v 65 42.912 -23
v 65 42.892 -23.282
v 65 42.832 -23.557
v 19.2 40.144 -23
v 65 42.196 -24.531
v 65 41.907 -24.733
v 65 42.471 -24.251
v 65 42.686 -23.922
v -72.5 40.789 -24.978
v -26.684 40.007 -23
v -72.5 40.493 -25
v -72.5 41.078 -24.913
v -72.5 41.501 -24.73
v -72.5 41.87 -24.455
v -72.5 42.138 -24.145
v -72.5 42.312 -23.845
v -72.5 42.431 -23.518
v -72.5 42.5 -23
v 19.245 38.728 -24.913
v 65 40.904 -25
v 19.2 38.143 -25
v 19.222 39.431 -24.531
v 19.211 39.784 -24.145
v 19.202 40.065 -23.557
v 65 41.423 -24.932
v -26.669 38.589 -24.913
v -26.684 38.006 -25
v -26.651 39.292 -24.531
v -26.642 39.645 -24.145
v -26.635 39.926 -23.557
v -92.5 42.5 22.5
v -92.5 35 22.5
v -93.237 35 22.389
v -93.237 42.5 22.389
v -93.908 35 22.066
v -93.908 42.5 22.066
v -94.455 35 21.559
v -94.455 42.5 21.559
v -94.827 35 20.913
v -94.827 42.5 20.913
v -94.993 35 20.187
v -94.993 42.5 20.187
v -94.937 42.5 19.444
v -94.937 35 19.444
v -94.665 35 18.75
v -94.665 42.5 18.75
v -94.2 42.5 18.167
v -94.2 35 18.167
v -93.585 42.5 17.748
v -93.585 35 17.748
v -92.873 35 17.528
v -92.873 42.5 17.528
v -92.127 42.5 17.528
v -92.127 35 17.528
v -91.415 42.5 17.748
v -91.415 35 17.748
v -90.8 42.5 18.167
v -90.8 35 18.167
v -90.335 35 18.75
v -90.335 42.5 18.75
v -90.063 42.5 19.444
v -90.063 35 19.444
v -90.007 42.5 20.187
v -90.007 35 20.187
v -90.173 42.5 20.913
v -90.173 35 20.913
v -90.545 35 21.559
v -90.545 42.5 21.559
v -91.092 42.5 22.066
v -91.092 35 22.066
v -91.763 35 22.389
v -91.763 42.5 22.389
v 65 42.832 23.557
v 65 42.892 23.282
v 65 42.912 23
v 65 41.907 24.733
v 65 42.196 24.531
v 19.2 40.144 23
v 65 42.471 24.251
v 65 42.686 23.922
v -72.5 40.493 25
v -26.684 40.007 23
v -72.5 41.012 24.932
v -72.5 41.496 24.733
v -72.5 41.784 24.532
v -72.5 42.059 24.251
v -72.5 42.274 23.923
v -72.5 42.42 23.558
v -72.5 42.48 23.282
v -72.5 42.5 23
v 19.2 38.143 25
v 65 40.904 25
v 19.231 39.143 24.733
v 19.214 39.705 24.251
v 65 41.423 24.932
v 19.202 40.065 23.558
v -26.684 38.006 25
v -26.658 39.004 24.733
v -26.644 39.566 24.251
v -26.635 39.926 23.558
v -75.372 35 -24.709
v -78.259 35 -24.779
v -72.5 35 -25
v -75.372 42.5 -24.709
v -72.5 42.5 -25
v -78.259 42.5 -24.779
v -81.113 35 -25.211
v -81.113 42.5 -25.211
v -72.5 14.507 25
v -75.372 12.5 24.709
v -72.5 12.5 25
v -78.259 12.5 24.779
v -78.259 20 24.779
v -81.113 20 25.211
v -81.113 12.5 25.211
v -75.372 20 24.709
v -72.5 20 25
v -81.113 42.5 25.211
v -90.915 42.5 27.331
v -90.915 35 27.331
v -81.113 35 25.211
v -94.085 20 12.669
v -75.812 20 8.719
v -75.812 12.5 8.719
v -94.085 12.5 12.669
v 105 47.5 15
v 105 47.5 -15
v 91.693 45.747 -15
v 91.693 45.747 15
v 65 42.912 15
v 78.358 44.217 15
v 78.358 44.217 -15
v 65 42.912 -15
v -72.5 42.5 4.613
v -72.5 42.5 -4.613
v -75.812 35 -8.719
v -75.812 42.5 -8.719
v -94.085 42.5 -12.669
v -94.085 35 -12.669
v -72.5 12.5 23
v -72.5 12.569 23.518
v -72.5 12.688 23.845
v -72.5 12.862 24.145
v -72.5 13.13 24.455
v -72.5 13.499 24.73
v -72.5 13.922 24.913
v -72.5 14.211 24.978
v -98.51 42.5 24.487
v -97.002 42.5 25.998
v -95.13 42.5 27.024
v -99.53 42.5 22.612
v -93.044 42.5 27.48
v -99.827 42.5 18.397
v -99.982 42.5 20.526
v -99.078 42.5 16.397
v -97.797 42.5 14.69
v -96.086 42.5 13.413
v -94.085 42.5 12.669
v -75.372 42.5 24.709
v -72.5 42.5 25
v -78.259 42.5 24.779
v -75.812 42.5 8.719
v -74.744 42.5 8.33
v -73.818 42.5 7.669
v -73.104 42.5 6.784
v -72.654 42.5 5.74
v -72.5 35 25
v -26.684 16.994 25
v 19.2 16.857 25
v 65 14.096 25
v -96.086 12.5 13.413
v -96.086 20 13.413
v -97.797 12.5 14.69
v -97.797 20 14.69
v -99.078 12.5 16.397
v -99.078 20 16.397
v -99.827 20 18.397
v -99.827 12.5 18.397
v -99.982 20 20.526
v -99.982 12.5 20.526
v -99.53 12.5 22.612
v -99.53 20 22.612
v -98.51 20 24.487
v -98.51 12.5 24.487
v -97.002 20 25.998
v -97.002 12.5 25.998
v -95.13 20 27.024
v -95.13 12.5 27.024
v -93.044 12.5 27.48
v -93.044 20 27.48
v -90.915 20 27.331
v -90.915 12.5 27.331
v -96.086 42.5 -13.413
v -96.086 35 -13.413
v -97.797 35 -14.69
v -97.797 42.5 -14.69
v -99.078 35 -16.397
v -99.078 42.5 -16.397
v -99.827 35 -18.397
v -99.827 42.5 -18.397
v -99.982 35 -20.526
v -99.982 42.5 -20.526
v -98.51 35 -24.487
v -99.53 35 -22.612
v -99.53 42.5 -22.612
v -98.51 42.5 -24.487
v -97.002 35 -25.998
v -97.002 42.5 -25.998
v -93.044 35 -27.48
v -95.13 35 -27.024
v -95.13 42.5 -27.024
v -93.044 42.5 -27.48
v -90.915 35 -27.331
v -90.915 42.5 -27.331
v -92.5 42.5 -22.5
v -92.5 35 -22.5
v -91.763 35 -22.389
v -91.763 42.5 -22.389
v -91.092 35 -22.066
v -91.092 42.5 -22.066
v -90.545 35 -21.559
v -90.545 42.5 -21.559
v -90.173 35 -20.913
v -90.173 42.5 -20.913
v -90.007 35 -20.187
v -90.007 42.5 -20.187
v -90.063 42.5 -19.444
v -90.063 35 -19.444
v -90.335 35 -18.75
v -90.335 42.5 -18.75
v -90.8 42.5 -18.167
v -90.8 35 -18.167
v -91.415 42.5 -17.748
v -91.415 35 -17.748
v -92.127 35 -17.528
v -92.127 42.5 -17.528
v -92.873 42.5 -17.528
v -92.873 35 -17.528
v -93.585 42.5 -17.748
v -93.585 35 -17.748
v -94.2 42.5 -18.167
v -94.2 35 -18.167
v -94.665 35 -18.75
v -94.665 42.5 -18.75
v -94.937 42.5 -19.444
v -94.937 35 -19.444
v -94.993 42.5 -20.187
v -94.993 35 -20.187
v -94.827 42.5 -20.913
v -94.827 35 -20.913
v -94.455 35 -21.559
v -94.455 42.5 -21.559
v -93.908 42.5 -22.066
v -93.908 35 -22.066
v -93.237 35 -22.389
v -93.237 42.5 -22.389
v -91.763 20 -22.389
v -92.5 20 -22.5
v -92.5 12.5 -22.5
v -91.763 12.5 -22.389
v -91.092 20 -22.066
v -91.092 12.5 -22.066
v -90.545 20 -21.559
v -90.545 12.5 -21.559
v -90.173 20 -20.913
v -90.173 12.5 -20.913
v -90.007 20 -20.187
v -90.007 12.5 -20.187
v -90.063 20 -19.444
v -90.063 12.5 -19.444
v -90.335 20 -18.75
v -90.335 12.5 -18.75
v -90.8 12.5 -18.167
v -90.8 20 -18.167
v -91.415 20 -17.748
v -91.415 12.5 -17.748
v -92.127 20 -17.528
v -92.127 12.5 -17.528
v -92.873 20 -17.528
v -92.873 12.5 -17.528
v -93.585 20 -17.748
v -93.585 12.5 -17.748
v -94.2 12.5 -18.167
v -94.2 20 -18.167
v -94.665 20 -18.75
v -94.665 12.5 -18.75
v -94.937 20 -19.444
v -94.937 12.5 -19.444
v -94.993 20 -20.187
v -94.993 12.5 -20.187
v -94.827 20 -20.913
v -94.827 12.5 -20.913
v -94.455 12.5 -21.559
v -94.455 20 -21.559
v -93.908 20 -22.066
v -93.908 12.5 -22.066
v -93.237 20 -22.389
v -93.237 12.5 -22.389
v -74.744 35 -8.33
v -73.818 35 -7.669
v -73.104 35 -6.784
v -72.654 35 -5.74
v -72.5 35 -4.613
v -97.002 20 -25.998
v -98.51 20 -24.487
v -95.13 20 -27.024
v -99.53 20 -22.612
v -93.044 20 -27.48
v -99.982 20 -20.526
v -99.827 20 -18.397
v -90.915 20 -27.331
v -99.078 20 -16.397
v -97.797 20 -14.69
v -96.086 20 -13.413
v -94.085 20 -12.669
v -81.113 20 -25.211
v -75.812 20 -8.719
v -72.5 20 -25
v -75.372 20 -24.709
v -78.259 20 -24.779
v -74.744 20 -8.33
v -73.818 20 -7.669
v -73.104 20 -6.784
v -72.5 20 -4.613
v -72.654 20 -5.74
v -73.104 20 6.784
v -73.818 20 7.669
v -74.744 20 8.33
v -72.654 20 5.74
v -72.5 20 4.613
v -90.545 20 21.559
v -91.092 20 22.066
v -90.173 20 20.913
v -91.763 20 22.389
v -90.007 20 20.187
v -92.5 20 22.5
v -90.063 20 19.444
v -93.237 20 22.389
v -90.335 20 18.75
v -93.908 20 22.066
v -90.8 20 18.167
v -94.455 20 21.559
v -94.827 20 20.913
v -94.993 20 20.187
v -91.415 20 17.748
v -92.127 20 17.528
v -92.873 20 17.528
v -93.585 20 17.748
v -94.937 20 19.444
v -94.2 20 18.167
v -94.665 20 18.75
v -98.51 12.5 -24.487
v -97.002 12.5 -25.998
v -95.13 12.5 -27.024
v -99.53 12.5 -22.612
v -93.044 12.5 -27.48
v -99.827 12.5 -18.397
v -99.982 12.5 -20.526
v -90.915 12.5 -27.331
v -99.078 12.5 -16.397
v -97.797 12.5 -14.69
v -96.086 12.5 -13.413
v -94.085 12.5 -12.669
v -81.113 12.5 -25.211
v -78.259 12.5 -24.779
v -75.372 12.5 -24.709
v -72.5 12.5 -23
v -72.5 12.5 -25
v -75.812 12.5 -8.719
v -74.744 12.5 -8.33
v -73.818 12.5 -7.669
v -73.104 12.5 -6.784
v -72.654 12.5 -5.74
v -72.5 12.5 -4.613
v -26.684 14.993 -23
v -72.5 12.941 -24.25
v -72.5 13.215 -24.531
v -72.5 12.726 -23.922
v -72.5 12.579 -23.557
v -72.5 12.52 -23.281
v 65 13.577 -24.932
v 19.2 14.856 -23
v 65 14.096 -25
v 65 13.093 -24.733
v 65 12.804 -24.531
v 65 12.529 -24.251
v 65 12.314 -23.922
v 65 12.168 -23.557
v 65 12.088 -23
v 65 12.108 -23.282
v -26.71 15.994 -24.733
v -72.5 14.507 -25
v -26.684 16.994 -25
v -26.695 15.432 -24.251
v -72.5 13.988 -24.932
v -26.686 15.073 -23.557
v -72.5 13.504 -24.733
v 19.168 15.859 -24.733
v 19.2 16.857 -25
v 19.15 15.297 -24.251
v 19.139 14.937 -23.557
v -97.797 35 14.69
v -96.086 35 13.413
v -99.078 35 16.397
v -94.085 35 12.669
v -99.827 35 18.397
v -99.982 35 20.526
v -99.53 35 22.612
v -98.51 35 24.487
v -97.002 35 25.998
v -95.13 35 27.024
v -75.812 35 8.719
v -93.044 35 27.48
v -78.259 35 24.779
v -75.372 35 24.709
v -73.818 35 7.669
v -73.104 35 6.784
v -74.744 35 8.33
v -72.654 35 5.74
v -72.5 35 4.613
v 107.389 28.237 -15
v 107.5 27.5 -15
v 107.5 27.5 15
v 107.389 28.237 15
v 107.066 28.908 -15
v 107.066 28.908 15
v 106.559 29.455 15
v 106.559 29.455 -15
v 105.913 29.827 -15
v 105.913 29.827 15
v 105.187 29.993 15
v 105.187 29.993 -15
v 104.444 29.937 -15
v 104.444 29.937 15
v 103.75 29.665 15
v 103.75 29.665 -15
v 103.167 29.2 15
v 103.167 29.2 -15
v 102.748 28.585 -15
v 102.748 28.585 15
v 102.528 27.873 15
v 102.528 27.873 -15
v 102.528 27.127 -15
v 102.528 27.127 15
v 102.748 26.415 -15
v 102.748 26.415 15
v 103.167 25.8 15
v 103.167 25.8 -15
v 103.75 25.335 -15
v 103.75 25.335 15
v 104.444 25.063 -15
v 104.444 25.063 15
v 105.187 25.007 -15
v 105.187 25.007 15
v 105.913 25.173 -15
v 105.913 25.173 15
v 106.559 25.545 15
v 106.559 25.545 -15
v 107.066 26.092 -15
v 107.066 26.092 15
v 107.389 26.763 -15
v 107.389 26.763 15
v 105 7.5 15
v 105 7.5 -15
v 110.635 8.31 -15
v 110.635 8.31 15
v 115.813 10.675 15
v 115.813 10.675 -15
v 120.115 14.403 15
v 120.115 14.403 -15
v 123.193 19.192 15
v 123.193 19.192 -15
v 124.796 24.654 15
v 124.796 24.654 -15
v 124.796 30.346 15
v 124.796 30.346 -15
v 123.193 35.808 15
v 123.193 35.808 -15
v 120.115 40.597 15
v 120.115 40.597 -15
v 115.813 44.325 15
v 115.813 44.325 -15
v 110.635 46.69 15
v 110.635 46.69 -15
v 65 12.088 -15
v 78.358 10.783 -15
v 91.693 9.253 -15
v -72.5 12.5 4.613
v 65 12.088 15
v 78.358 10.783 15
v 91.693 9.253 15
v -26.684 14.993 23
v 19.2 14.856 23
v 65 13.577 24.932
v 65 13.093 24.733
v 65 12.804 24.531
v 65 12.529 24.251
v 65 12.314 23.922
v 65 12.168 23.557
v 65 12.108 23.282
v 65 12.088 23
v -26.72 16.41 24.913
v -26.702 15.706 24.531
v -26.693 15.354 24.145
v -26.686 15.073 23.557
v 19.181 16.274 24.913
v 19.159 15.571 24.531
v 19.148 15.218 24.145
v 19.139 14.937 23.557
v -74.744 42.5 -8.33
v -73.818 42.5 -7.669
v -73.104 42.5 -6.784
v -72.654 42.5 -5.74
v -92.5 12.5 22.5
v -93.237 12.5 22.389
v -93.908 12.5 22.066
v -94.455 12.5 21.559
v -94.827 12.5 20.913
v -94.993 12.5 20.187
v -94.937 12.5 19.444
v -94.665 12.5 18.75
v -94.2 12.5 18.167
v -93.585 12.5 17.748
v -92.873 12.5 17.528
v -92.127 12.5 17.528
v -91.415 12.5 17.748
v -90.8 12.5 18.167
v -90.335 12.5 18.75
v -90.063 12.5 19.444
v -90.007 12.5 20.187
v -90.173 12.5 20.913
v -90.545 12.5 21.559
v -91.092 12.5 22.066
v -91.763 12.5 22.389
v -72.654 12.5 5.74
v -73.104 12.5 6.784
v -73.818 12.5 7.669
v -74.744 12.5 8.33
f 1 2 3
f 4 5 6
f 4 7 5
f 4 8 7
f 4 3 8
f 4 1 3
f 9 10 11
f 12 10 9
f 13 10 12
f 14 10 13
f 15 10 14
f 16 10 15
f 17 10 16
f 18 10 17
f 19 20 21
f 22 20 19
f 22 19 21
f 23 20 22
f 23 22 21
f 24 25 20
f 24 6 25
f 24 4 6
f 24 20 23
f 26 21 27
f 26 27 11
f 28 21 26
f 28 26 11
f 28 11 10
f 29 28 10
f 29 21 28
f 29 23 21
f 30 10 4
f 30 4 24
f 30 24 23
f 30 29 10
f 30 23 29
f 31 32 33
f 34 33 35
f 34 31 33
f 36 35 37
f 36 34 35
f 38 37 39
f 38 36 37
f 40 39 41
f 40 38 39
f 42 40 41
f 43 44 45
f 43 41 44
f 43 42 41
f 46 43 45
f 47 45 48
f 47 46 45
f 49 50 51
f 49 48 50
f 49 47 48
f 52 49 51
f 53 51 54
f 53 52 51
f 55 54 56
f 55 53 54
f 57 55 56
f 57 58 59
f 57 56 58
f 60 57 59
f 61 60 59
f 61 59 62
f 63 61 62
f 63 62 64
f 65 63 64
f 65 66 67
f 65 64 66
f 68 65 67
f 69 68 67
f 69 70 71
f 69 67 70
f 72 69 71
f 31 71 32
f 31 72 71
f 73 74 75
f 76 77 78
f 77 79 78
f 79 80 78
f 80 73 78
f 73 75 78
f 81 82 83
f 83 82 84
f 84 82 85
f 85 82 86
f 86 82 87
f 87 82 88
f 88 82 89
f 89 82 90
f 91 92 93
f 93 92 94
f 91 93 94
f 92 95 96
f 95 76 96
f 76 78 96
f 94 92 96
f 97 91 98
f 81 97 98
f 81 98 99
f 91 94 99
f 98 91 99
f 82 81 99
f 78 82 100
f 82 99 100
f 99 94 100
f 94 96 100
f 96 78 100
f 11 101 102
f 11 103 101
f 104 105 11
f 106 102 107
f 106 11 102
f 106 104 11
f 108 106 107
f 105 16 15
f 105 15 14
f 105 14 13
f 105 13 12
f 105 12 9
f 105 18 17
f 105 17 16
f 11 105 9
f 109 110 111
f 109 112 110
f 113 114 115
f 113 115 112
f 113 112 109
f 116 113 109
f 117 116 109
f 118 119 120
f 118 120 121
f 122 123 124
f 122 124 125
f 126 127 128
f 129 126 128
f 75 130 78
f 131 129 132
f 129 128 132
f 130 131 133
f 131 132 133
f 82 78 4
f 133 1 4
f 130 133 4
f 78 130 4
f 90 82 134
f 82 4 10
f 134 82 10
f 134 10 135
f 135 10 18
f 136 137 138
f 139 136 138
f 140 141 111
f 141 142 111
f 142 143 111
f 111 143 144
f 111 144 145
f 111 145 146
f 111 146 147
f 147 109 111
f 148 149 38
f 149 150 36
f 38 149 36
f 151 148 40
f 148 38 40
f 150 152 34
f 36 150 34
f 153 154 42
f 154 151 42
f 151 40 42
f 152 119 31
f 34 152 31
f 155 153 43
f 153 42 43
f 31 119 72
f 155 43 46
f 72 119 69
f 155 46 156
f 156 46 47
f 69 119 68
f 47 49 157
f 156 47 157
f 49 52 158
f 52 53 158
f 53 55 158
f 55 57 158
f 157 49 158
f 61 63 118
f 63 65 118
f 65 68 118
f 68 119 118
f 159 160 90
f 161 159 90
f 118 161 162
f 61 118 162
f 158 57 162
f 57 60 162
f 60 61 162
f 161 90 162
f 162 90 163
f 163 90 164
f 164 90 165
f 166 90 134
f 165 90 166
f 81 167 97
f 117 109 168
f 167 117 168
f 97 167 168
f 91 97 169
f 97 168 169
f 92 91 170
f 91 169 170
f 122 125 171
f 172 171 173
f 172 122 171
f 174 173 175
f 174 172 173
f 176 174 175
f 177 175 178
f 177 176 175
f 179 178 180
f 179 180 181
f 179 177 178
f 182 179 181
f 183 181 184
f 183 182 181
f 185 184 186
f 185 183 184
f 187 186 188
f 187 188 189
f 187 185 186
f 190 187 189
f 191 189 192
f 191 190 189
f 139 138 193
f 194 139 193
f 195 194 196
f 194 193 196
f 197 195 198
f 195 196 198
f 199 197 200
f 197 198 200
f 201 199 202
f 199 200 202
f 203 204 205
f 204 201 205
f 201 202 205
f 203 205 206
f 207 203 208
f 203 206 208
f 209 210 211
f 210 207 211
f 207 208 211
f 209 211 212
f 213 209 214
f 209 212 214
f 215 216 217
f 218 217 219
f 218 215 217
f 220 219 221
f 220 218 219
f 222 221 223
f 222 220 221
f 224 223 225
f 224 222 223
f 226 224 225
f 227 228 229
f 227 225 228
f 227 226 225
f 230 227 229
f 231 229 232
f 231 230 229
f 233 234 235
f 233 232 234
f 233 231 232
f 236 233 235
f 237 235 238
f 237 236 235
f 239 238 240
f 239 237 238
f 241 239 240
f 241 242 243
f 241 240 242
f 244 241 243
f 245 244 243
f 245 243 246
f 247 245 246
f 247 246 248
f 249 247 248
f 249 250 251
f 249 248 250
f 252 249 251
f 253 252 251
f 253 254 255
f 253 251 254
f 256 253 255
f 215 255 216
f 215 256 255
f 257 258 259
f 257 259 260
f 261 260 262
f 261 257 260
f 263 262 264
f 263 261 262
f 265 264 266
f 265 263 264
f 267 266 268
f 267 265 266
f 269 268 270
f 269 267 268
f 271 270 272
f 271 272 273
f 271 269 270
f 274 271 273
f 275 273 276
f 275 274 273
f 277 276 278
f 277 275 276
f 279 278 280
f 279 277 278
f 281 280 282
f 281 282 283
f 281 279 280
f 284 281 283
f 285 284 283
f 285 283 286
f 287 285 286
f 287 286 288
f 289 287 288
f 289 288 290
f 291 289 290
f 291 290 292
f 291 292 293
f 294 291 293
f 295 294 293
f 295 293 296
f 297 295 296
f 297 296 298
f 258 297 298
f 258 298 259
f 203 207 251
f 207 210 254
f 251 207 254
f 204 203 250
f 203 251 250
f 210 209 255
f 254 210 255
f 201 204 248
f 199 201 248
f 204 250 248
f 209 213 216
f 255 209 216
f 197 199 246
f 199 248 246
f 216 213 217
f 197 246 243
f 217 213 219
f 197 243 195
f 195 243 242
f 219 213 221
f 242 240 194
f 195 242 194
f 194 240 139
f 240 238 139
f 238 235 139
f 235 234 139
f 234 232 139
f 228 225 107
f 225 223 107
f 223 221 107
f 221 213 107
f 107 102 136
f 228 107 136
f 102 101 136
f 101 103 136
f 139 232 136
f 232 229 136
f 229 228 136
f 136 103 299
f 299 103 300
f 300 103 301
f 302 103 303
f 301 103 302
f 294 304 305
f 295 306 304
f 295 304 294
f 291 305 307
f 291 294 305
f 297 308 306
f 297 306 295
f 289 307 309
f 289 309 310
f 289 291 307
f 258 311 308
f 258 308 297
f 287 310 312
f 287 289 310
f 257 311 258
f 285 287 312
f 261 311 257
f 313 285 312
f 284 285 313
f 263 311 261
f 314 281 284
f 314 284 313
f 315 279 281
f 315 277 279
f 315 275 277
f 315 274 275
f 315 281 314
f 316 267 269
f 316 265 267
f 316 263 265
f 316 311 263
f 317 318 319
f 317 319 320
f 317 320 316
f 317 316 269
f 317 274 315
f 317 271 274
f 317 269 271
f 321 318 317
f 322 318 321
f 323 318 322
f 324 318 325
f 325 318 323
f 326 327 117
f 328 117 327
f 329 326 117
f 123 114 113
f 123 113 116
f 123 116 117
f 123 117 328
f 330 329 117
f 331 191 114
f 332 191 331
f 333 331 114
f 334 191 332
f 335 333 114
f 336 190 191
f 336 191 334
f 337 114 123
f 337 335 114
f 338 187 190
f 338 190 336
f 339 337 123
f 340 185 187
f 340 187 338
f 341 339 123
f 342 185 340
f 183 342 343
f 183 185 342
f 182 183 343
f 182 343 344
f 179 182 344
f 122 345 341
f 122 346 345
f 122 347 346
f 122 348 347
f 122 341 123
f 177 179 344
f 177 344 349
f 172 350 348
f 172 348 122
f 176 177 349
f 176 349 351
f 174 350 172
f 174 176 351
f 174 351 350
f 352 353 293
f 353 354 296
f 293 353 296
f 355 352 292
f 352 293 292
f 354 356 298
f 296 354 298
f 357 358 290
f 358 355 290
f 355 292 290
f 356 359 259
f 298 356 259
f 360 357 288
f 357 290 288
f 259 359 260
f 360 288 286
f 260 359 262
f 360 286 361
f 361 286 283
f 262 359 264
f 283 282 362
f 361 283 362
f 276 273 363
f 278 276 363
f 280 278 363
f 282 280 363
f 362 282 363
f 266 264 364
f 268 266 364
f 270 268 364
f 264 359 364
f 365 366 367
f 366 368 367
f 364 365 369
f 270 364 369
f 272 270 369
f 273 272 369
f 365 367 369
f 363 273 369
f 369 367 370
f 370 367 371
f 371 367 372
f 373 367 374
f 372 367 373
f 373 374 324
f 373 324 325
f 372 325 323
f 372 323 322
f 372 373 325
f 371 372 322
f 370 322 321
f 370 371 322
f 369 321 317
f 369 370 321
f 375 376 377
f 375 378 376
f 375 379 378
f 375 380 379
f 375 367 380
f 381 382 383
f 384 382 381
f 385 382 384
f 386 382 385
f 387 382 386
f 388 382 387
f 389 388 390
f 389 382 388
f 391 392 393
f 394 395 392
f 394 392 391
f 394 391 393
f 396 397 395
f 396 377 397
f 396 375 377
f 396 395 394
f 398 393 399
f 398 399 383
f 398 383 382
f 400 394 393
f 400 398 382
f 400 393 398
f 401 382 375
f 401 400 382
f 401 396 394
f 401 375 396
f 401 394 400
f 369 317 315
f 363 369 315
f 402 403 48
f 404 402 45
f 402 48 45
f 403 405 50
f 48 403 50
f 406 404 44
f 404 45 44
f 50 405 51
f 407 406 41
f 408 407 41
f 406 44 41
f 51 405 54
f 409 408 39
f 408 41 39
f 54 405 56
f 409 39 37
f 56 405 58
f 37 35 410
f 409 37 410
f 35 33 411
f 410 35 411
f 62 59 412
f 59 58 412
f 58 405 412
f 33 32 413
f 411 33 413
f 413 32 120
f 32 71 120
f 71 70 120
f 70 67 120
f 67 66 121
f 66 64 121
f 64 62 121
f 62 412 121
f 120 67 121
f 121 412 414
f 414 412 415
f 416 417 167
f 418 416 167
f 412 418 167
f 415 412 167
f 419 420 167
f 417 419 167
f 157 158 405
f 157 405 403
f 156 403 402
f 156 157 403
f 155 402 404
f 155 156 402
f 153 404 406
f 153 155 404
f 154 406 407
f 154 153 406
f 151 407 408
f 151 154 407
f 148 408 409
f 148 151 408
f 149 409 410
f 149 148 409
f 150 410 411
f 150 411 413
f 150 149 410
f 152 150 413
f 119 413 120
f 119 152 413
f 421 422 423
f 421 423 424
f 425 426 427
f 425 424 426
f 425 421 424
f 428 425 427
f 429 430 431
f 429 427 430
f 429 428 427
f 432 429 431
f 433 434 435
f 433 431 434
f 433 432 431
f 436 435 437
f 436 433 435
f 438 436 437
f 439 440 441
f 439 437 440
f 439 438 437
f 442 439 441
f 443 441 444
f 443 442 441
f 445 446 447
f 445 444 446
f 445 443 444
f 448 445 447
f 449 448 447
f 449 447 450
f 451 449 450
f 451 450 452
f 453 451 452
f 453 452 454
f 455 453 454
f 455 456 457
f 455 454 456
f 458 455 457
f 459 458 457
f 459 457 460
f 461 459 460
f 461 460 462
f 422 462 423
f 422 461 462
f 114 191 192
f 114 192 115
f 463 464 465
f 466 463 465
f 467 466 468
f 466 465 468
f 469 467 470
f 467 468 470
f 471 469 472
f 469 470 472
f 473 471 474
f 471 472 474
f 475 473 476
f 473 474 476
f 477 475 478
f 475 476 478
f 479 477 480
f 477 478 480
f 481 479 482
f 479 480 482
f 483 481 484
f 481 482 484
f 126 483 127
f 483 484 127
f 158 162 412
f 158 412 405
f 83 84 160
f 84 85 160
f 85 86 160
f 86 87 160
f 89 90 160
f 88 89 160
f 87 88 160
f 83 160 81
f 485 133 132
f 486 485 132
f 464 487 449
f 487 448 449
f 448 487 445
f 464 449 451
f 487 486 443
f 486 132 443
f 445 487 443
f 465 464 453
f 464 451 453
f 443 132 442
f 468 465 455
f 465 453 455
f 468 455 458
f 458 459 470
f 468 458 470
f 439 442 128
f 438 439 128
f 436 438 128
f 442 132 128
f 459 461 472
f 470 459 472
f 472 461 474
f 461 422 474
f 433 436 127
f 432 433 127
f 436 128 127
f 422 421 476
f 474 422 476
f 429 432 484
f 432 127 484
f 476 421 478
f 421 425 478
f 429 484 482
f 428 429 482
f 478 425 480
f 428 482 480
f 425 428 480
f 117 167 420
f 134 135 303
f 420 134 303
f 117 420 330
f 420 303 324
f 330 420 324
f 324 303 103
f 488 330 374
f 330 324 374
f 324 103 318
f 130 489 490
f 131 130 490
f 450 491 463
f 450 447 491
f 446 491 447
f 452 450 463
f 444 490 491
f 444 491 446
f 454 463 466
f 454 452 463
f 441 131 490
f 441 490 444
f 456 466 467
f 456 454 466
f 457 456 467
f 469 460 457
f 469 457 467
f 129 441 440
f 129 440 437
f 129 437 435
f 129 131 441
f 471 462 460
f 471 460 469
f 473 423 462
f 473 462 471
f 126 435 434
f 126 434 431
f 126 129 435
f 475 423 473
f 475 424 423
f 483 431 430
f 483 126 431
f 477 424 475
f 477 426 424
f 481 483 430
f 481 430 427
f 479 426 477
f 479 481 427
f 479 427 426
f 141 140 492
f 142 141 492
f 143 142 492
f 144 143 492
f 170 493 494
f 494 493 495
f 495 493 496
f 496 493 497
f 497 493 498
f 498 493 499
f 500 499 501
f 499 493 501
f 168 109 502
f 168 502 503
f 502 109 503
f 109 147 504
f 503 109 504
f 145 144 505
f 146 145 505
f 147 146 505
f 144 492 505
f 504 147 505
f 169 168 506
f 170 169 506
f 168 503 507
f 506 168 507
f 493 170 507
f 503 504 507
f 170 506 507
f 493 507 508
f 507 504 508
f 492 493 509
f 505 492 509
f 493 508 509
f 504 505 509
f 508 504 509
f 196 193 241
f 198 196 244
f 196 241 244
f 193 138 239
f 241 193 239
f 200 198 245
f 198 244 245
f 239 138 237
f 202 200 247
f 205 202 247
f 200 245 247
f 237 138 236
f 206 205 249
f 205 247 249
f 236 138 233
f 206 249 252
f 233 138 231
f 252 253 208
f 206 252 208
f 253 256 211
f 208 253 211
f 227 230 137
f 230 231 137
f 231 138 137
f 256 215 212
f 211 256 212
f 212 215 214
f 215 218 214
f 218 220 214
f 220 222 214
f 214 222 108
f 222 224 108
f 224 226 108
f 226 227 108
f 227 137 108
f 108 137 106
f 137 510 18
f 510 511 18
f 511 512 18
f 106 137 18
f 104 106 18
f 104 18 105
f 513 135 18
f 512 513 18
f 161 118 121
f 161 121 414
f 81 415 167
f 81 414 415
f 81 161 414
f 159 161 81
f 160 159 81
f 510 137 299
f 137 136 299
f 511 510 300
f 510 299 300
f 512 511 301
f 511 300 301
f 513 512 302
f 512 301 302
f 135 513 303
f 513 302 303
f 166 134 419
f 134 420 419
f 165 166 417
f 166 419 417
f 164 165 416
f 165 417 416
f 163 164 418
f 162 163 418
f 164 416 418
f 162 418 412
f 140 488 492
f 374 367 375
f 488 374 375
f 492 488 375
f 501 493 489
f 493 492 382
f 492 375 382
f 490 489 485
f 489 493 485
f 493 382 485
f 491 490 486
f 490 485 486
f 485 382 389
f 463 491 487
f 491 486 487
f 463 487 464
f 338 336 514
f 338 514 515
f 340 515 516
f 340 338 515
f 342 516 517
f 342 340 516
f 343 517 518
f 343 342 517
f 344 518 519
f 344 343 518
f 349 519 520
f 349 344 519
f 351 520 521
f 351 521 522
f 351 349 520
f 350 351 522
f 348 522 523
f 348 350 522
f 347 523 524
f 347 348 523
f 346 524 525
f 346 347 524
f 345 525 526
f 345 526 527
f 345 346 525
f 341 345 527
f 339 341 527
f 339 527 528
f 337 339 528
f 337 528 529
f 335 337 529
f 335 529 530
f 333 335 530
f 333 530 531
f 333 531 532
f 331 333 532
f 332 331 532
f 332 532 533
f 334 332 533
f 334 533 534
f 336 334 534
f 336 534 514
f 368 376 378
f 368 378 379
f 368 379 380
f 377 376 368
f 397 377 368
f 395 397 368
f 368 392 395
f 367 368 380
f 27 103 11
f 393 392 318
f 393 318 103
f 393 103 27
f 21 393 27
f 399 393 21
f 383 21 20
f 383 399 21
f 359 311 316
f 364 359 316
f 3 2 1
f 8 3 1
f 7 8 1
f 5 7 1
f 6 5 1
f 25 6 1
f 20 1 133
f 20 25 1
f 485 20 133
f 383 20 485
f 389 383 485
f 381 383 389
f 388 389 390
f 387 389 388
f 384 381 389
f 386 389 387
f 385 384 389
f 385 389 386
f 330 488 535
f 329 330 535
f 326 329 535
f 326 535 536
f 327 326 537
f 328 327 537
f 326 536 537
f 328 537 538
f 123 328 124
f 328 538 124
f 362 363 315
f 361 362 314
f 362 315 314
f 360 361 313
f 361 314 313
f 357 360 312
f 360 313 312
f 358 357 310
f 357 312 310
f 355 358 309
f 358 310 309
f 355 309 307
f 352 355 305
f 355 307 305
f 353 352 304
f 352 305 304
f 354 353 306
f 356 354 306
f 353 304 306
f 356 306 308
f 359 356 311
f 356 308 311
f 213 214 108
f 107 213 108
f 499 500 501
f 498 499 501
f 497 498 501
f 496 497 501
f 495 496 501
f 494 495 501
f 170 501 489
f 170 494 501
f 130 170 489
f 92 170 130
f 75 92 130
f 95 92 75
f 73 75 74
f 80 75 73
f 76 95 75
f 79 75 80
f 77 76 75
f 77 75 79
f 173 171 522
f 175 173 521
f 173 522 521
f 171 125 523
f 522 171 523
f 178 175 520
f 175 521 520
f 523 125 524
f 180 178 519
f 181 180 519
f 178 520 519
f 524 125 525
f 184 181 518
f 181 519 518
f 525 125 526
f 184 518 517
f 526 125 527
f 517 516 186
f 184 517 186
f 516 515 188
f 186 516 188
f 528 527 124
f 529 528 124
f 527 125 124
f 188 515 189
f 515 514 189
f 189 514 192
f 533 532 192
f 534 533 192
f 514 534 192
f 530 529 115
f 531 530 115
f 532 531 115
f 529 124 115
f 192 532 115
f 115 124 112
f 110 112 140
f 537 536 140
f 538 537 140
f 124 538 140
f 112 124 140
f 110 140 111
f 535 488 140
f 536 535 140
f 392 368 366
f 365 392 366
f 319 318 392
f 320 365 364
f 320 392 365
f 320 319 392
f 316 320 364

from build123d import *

# Parameters (mm, degrees)
SKETCH1_W               = 250
SKETCH1_H               = 50
BOSS_EXTRUDE1_DEPTH     = 55
CUT_EXTRUDE2_DEPTH      = 146.430395722
CUT_EXTRUDE2_DEPTH_BACK = 146.430395722
SKETCH4_OUTSIDE_W       = 304.164
SKETCH4_OUTSIDE_H       = 109.164
FILLET2_R               = 2
CUT_EXTRUDE3_DEPTH      = 143.762915509
CUT_EXTRUDE3_DEPTH_BACK = 143.762915509
SKETCH7_R               = 2.5
SKETCH12_W              = 86.46924187
SKETCH12_H              = 64.710234819
CUT_EXTRUDE7_DEPTH      = 10
CUT_EXTRUDE8_DEPTH      = 10
SKETCH14_R              = 2.5
BOSS_EXTRUDE2_DEPTH     = 30
SKETCH16_W              = 96.26246385
SKETCH16_H              = 15
CUT_EXTRUDE9_DEPTH      = 50
FILLET3_R               = 4.2
FILLET4_R               = 23


with BuildPart() as part:
    # Sketch1 → Boss-Extrude1 (new body)
    with BuildSketch(Plane(origin=(0, 0, 0), x_dir=(1, 0, 0), z_dir=(0, 1, 0))):
        Rectangle(SKETCH1_W, SKETCH1_H)
    extrude(amount=BOSS_EXTRUDE1_DEPTH)

    # Sketch4 outside → Cut-Extrude2 (cut, two sides: drawn at the far end of the back side and taken through both)
    with BuildSketch(Plane.XY.offset(25).offset(-CUT_EXTRUDE2_DEPTH_BACK)):
        with Locations((0, 27.5)):
            Rectangle(SKETCH4_OUTSIDE_W, SKETCH4_OUTSIDE_H)
        with BuildLine():
            Line((-72.5, 42.5), (-72.5, 12.5))
            ThreePointArc((-72.5, 12.5), (16.389156704, 14.940062989), (105, 7.5))
            ThreePointArc((105, 7.5), (125, 27.5), (105, 47.5))
            ThreePointArc((105, 47.5), (16.389156704, 40.059937011), (-72.5, 42.5))
        make_face(mode=Mode.SUBTRACT)
    extrude(amount=CUT_EXTRUDE2_DEPTH + CUT_EXTRUDE2_DEPTH_BACK, mode=Mode.SUBTRACT)

    # Fillet2
    fillet2_edges = [part.edges().sort_by_distance(p)[0] for p in [
        (16.389156704, 14.940062989, 25),
        (16.389156704, 40.059937011, 25),
        (16.389156704, 40.059937011, -25),
        (16.389156704, 14.940062989, -25),
    ]]
    fillet(fillet2_edges, radius=FILLET2_R)

    # Sketch7 → Cut-Extrude3 (cut, two sides: drawn at the far end of the back side and taken through both)
    with BuildSketch(Plane.XY.offset(25).offset(-CUT_EXTRUDE3_DEPTH_BACK)):
        with Locations((105, 27.5)):
            Circle(SKETCH7_R)
    extrude(amount=CUT_EXTRUDE3_DEPTH + CUT_EXTRUDE3_DEPTH_BACK, mode=Mode.SUBTRACT)

    # Sketch12 → Cut-Extrude7 (cut)
    with BuildSketch(Plane.XY.offset(25)):
        with Locations((108.234620935, 27.636294559)):
            Rectangle(SKETCH12_W, SKETCH12_H)
    extrude(amount=-CUT_EXTRUDE7_DEPTH, mode=Mode.SUBTRACT)

    # Sketch13 → Cut-Extrude8 (cut)
    with BuildSketch(Plane(origin=(0, 0, -25), x_dir=(-1, 0, 0), z_dir=(0, 0, -1))):
        with BuildLine():
            Line((-65, 42.911811435), (-65, 12.088188565))
            ThreePointArc((-65, 12.088188565), (-85.028868782, 10.045773403), (-105, 7.5))
            ThreePointArc((-105, 7.5), (-125, 27.5), (-105, 47.5))
            ThreePointArc((-105, 47.5), (-85.028868782, 44.954226597), (-65, 42.911811435))
        make_face()
    extrude(amount=-CUT_EXTRUDE8_DEPTH, mode=Mode.SUBTRACT)

    # Sketch14 → Boss-Extrude2 (add)
    # profile 1 of 2: a face of its own
    with BuildSketch(Plane(origin=(0, 42.5, 0), x_dir=(0, 0, 1), z_dir=(0, -1, 0))):
        with BuildLine():
            Line((-8.002367609, 72.5), (-12.669393759, 94.084995944))
            ThreePointArc((-12.669393759, 94.084995944), (-21.584995944, 99.830606241), (-27.330606241, 90.915004056))
            Line((-27.330606241, 90.915004056), (-23.348983742, 72.5))
            Line((-23.348983742, 72.5), (-8.002367609, 72.5))
        make_face()
        with Locations(Location((-20, 92.5, 0), (0, 0, 180))):
            Circle(SKETCH14_R, mode=Mode.SUBTRACT)
    # profile 2 of 2: a face of its own
    with BuildSketch(Plane(origin=(0, 42.5, 0), x_dir=(0, 0, 1), z_dir=(0, -1, 0))):
        with BuildLine():
            Line((27.330606241, 90.915004056), (23.348983742, 72.5))
            Line((23.348983742, 72.5), (8.002367609, 72.5))
            Line((8.002367609, 72.5), (12.669393759, 94.084995944))
            ThreePointArc((12.669393759, 94.084995944), (21.584995944, 99.830606241), (27.330606241, 90.915004056))
        make_face()
        with Locations((20, 92.5)):
            Circle(SKETCH14_R, mode=Mode.SUBTRACT)
    extrude(amount=BOSS_EXTRUDE2_DEPTH)

    # Sketch16 → Cut-Extrude9 (cut)
    with BuildSketch(Plane.ZY.offset(72.5)):
        with Locations((4.383084191, 27.5)):
            Rectangle(SKETCH16_W, SKETCH16_H)
    extrude(amount=CUT_EXTRUDE9_DEPTH, mode=Mode.SUBTRACT)

    # Fillet3
    fillet3_edges = [part.edges().sort_by_distance(p)[0] for p in [
        (-72.5, 16.25, -8.002367609),
        (-72.5, 16.25, 8.002367609),
        (-72.5, 38.75, 8.002367609),
        (-72.5, 38.75, -8.002367609),
    ]]
    fillet(fillet3_edges, radius=FILLET3_R)

    # Fillet4
    # the kernel refuses this fillet: 23 mm, written as the material it adds along each edge
    with BuildSketch(Plane(origin=(-72.5, 42.030514973, -23.348983742), x_dir=(0, 0, -1), z_dir=(0, -1, 0))) as fillet4_piece_1_section:
        with BuildLine():
            CenterArc((24.342833905, -3.752520734), FILLET4_R, 170.610040363, 21.590428365)
            Line((1.8623081, -8.613174962), (0, 0))
            Line((0, 0), (1.651016258, 0))
        make_face()
    fillet4_piece_1 = extrude(amount=51.530241063, mode=Mode.PRIVATE)
    fillet4_piece_1 = split(fillet4_piece_1, bisect_by=Plane(origin=(-72.5, 35, -23.348983742), z_dir=(0, 1, 0)), keep=Keep.TOP, mode=Mode.PRIVATE)
    add(fillet4_piece_1)
    with BuildSketch(Plane(origin=(-72.5, 20, -23.348983742), x_dir=(0, 0, -1), z_dir=(0, -1, 0))) as fillet4_piece_2_section:
        with BuildLine():
            CenterArc((24.342833905, -3.752520734), FILLET4_R, 170.610040363, 21.590428365)
            Line((1.8623081, -8.613174962), (0, 0))
            Line((0, 0), (1.651016258, 0))
        make_face()
    fillet4_piece_2 = extrude(amount=29.49972609, mode=Mode.PRIVATE)
    fillet4_piece_2 = split(fillet4_piece_2, bisect_by=Plane(origin=(-72.5, 12.5, -23.348983742), z_dir=(0, 1, 0)), keep=Keep.TOP, mode=Mode.PRIVATE)
    add(fillet4_piece_2)
    with BuildSketch(Plane(origin=(-72.5, 64.49972609, -23.348983742), x_dir=(0, 0, -1), z_dir=(0, -1, 0))) as fillet4_piece_3_section:
        with BuildLine():
            CenterArc((24.342833905, -3.752520734), FILLET4_R, 170.610040363, 21.590428365)
            Line((1.8623081, -8.613174962), (0, 0))
            Line((0, 0), (1.651016258, 0))
        make_face()
    fillet4_piece_3 = extrude(amount=29.49972609, mode=Mode.PRIVATE)
    fillet4_piece_3 = split(fillet4_piece_3, bisect_by=Plane(origin=(-72.5, 42.5, -23.348983742), z_dir=(0, -1, 0)), keep=Keep.TOP, mode=Mode.PRIVATE)
    add(fillet4_piece_3)
    with BuildSketch(Plane(origin=(-72.5, 64.49972609, -23.348983742), x_dir=(0, 0, -1), z_dir=(0, -1, 0))) as fillet4_piece_4_section:
        with BuildLine():
            CenterArc((24.342833905, -3.752520734), FILLET4_R, 170.610040363, 21.590428365)
            Line((1.8623081, -8.613174962), (0, 0))
            Line((0, 0), (1.651016258, 0))
        make_face()
    fillet4_piece_4 = extrude(amount=51.530241063, mode=Mode.PRIVATE)
    fillet4_piece_4 = split(fillet4_piece_4, bisect_by=Plane(origin=(-72.5, 20, -23.348983742), z_dir=(0, -1, 0)), keep=Keep.TOP, mode=Mode.PRIVATE)
    add(fillet4_piece_4)
    with BuildSketch(Plane(origin=(-72.5, 42.030514973, 23.348983742), x_dir=(0, 0, 1), z_dir=(0, -1, 0))) as fillet4_piece_5_section:
        with BuildLine():
            CenterArc((24.342833905, 3.752520734), FILLET4_R, 167.799531273, 21.590428365)
            Line((1.8623081, 8.613174962), (0, 0))
            Line((0, 0), (1.651016258, 0))
        make_face()
    fillet4_piece_5 = extrude(amount=51.530241063, mode=Mode.PRIVATE)
    fillet4_piece_5 = split(fillet4_piece_5, bisect_by=Plane(origin=(-72.5, 35, 23.348983742), z_dir=(0, 1, 0)), keep=Keep.TOP, mode=Mode.PRIVATE)
    add(fillet4_piece_5)
    with BuildSketch(Plane(origin=(-72.5, 20, 23.348983742), x_dir=(0, 0, 1), z_dir=(0, -1, 0))) as fillet4_piece_6_section:
        with BuildLine():
            CenterArc((24.342833905, 3.752520734), FILLET4_R, 167.799531273, 21.590428365)
            Line((1.8623081, 8.613174962), (0, 0))
            Line((0, 0), (1.651016258, 0))
        make_face()
    fillet4_piece_6 = extrude(amount=29.49972609, mode=Mode.PRIVATE)
    fillet4_piece_6 = split(fillet4_piece_6, bisect_by=Plane(origin=(-72.5, 12.5, 23.348983742), z_dir=(0, 1, 0)), keep=Keep.TOP, mode=Mode.PRIVATE)
    add(fillet4_piece_6)
    with BuildSketch(Plane(origin=(-72.5, 64.49972609, 23.348983742), x_dir=(0, 0, 1), z_dir=(0, -1, 0))) as fillet4_piece_7_section:
        with BuildLine():
            CenterArc((24.342833905, 3.752520734), FILLET4_R, 167.799531273, 21.590428365)
            Line((1.8623081, 8.613174962), (0, 0))
            Line((0, 0), (1.651016258, 0))
        make_face()
    fillet4_piece_7 = extrude(amount=29.49972609, mode=Mode.PRIVATE)
    fillet4_piece_7 = split(fillet4_piece_7, bisect_by=Plane(origin=(-72.5, 42.5, 23.348983742), z_dir=(0, -1, 0)), keep=Keep.TOP, mode=Mode.PRIVATE)
    add(fillet4_piece_7)
    with BuildSketch(Plane(origin=(-72.5, 64.49972609, 23.348983742), x_dir=(0, 0, 1), z_dir=(0, -1, 0))) as fillet4_piece_8_section:
        with BuildLine():
            CenterArc((24.342833905, 3.752520734), FILLET4_R, 167.799531273, 21.590428365)
            Line((1.8623081, 8.613174962), (0, 0))
            Line((0, 0), (1.651016258, 0))
        make_face()
    fillet4_piece_8 = extrude(amount=51.530241063, mode=Mode.PRIVATE)
    fillet4_piece_8 = split(fillet4_piece_8, bisect_by=Plane(origin=(-72.5, 20, 23.348983742), z_dir=(0, -1, 0)), keep=Keep.TOP, mode=Mode.PRIVATE)
    add(fillet4_piece_8)


solid = part.part
